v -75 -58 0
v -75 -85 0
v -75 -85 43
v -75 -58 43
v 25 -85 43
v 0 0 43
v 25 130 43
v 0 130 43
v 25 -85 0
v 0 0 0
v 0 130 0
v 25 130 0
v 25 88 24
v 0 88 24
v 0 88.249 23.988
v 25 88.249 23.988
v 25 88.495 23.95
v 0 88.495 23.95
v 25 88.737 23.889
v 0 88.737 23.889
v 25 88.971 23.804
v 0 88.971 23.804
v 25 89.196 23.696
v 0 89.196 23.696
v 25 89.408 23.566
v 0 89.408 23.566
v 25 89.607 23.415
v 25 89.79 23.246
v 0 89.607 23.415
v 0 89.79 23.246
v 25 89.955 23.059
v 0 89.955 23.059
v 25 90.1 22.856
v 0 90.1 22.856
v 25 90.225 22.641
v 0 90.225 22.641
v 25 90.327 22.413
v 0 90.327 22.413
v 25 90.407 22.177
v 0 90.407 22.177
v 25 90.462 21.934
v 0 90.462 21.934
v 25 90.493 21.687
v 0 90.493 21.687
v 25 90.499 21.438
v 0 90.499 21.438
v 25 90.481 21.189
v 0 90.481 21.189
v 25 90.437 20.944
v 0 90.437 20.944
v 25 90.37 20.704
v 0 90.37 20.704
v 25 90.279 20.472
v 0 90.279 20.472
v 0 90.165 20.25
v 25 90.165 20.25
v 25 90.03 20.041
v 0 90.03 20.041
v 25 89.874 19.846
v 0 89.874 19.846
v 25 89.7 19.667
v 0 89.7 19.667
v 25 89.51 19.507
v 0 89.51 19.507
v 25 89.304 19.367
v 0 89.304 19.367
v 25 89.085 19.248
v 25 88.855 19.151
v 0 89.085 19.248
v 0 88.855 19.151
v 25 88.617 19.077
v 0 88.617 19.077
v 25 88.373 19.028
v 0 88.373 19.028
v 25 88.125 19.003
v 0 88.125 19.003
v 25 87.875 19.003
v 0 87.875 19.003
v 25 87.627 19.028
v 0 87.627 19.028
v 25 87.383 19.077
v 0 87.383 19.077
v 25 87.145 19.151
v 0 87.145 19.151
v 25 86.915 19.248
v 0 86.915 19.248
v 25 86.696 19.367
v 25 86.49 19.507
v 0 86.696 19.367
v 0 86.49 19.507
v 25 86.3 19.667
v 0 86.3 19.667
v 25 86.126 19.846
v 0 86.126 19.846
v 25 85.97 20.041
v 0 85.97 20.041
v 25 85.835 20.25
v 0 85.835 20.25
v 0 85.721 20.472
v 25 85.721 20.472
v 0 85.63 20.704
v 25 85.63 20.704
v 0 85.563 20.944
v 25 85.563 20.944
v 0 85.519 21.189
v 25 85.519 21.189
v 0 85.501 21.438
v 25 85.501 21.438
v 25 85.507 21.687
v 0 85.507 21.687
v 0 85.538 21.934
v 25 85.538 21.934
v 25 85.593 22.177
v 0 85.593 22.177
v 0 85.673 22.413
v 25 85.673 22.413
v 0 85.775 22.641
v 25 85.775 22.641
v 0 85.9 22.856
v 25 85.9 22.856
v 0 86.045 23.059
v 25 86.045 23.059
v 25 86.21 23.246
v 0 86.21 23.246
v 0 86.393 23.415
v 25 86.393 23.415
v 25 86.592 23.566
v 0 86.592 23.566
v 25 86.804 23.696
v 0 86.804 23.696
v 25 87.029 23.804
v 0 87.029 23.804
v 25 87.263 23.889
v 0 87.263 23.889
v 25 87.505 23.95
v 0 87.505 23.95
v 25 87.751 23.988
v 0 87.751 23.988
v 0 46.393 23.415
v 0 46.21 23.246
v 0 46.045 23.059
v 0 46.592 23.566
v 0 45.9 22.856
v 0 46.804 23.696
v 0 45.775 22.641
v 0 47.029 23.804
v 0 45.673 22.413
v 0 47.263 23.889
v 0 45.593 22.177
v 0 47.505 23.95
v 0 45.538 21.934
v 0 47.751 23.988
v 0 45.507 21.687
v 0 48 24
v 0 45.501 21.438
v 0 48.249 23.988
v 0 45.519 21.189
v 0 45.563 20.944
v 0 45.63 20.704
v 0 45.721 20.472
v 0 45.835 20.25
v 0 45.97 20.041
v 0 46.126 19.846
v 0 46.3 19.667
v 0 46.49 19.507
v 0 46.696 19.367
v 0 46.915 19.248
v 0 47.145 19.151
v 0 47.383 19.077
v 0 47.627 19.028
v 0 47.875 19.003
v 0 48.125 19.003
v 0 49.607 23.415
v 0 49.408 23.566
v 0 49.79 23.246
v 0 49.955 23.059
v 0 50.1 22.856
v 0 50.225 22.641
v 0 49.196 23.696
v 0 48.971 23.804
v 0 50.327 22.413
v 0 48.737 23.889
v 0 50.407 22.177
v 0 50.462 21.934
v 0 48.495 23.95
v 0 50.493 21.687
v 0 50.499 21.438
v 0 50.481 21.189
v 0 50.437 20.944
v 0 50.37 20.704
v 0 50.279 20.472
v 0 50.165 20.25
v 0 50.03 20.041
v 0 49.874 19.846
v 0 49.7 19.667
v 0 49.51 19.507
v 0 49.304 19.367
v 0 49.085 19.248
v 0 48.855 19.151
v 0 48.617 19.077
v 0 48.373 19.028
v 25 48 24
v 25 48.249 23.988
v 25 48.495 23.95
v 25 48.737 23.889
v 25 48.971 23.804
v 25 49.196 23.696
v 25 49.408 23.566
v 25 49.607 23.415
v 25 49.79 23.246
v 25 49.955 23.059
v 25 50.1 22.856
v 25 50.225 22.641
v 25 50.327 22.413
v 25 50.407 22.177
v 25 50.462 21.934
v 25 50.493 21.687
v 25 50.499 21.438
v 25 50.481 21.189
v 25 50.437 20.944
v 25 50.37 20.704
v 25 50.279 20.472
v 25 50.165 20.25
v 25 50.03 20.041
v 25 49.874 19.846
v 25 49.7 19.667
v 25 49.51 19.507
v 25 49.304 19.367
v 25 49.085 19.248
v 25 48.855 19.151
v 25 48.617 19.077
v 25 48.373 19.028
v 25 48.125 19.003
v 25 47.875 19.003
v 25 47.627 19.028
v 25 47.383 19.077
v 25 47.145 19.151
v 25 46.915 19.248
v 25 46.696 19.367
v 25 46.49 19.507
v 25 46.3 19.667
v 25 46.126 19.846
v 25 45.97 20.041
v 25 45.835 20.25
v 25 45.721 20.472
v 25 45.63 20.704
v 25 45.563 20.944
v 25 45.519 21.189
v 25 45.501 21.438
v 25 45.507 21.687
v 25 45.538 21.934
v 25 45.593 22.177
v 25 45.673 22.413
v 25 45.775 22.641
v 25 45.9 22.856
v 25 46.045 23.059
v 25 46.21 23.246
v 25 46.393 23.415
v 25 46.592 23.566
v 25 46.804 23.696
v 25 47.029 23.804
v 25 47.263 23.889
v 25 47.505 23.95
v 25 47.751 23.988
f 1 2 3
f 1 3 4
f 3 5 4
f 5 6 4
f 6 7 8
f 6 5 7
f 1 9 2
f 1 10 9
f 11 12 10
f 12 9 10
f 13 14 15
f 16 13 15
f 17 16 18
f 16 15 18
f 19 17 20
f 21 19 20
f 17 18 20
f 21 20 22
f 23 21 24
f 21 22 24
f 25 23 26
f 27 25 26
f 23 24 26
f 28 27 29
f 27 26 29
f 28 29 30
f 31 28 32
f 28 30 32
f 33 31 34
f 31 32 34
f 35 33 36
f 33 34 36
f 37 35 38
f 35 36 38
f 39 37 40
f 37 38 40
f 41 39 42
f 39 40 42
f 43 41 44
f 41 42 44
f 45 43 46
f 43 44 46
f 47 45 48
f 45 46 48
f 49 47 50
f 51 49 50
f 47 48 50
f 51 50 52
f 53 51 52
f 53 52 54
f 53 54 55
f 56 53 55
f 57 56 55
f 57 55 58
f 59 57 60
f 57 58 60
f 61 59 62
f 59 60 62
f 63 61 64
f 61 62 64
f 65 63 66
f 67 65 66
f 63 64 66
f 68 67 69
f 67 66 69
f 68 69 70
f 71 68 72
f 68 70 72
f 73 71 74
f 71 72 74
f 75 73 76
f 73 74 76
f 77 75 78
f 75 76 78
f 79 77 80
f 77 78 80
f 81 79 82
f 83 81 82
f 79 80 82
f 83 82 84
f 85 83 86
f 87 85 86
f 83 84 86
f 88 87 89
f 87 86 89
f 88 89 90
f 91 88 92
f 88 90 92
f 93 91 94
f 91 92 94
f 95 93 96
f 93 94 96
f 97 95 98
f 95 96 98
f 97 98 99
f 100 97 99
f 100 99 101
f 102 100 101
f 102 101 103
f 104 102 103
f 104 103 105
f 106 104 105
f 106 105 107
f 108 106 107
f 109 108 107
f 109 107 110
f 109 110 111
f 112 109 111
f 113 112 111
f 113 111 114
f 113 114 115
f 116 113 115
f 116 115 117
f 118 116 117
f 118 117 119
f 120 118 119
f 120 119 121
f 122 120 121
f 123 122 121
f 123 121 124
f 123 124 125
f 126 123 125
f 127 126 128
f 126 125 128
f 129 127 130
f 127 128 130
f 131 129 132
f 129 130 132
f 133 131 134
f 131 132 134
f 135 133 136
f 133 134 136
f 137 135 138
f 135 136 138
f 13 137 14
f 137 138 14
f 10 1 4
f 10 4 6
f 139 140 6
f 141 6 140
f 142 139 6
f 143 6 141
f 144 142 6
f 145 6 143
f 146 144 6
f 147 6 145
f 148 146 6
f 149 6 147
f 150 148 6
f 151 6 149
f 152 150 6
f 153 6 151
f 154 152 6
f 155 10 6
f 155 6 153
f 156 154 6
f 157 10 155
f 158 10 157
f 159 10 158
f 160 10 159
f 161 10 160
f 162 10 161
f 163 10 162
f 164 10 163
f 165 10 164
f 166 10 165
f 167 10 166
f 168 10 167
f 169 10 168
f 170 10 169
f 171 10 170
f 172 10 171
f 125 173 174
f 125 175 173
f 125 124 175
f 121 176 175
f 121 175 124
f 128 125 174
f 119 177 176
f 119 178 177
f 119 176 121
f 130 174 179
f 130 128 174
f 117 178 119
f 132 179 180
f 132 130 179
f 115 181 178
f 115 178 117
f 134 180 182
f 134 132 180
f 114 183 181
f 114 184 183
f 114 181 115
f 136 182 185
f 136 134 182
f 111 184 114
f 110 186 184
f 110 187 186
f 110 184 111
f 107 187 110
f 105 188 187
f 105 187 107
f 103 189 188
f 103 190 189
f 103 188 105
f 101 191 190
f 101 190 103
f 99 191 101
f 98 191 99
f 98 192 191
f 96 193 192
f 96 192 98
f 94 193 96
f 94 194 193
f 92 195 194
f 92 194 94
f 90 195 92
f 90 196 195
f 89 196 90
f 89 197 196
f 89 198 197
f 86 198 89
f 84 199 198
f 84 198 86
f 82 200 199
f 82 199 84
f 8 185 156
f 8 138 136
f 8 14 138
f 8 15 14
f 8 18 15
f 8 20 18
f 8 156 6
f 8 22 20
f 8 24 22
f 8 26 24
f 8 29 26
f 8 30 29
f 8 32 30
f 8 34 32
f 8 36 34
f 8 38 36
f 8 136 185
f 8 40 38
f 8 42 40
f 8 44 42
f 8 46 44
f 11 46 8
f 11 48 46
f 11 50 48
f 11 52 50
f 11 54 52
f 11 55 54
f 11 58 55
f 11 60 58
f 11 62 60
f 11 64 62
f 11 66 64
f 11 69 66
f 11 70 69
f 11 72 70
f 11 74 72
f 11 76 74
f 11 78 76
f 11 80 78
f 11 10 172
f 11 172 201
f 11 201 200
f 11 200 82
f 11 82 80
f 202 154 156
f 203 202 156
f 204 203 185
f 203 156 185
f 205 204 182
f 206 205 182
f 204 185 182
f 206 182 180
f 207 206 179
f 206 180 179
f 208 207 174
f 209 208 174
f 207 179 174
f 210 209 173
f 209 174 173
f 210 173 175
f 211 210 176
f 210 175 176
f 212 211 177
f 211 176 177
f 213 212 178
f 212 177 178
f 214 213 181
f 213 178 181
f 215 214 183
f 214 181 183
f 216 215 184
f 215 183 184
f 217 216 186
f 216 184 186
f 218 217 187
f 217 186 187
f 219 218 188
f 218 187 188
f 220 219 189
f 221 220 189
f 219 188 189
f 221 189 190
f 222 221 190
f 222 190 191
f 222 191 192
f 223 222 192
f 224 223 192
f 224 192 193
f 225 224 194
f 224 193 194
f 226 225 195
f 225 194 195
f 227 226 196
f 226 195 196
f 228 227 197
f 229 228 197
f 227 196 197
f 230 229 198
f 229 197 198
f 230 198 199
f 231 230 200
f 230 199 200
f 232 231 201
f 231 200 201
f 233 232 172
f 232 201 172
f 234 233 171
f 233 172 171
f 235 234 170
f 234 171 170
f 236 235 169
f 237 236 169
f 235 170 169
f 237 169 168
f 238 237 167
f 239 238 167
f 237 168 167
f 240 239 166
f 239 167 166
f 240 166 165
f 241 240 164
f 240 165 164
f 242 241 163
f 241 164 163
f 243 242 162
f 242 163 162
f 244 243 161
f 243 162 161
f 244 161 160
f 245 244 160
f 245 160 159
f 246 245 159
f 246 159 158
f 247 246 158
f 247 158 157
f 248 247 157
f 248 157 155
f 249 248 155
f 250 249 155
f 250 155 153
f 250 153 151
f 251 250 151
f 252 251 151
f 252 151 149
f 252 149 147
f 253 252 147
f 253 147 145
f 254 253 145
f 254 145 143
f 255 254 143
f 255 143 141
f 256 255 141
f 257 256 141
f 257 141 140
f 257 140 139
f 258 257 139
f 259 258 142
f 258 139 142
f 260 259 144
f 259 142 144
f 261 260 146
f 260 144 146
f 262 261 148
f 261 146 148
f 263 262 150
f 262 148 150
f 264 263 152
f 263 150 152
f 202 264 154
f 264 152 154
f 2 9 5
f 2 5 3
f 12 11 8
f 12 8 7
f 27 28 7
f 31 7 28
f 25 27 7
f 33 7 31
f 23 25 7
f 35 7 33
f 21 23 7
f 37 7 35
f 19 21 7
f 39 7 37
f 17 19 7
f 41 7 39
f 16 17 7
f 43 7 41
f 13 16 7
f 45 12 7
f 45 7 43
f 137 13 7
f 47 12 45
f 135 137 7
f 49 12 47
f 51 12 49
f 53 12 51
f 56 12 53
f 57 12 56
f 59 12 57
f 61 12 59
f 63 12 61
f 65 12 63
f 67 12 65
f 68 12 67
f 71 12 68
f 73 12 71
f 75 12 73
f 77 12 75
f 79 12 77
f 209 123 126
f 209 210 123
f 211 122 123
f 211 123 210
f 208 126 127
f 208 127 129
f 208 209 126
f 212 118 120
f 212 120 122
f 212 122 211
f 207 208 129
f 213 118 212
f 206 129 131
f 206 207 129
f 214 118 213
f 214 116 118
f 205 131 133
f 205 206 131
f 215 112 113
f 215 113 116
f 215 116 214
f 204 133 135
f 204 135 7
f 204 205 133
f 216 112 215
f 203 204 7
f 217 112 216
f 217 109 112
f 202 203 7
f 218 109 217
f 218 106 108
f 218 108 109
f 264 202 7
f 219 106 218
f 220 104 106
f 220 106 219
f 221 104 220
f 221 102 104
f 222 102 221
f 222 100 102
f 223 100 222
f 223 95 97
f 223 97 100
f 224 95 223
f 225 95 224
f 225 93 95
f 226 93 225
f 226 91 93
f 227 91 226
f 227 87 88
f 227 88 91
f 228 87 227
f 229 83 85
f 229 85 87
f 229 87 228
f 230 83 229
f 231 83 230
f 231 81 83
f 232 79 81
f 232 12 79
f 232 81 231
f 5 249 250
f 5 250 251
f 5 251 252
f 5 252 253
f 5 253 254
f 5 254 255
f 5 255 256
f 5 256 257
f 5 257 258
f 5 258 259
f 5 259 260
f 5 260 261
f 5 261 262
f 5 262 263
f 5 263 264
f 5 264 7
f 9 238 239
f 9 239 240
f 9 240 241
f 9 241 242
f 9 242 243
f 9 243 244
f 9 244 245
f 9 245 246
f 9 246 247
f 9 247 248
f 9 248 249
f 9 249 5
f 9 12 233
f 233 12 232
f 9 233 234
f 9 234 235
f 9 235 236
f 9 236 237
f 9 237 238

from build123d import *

# Parameters (mm, degrees)
BOSS_EXTRUDE1_DEPTH = 43
SKETCH2_R           = 2.5
CUT_EXTRUDE1_DEPTH  = 25


with BuildPart() as part:
    # Sketch1 → Boss-Extrude1 (new body)
    with BuildSketch(Plane.XY):
        Polygon((0, 0), (0, 130), (25, 130), (25, -85), (-75, -85), (-75, -58), align=None)
    extrude(amount=BOSS_EXTRUDE1_DEPTH)

    # Sketch2 → Cut-Extrude1 (cut)
    with BuildSketch(Plane.ZY):
        with Locations((21.5, 88)):
            Circle(SKETCH2_R)
        with Locations((21.5, 48)):
            Circle(SKETCH2_R)
    extrude(amount=-CUT_EXTRUDE1_DEPTH, mode=Mode.SUBTRACT)


solid = part.part
